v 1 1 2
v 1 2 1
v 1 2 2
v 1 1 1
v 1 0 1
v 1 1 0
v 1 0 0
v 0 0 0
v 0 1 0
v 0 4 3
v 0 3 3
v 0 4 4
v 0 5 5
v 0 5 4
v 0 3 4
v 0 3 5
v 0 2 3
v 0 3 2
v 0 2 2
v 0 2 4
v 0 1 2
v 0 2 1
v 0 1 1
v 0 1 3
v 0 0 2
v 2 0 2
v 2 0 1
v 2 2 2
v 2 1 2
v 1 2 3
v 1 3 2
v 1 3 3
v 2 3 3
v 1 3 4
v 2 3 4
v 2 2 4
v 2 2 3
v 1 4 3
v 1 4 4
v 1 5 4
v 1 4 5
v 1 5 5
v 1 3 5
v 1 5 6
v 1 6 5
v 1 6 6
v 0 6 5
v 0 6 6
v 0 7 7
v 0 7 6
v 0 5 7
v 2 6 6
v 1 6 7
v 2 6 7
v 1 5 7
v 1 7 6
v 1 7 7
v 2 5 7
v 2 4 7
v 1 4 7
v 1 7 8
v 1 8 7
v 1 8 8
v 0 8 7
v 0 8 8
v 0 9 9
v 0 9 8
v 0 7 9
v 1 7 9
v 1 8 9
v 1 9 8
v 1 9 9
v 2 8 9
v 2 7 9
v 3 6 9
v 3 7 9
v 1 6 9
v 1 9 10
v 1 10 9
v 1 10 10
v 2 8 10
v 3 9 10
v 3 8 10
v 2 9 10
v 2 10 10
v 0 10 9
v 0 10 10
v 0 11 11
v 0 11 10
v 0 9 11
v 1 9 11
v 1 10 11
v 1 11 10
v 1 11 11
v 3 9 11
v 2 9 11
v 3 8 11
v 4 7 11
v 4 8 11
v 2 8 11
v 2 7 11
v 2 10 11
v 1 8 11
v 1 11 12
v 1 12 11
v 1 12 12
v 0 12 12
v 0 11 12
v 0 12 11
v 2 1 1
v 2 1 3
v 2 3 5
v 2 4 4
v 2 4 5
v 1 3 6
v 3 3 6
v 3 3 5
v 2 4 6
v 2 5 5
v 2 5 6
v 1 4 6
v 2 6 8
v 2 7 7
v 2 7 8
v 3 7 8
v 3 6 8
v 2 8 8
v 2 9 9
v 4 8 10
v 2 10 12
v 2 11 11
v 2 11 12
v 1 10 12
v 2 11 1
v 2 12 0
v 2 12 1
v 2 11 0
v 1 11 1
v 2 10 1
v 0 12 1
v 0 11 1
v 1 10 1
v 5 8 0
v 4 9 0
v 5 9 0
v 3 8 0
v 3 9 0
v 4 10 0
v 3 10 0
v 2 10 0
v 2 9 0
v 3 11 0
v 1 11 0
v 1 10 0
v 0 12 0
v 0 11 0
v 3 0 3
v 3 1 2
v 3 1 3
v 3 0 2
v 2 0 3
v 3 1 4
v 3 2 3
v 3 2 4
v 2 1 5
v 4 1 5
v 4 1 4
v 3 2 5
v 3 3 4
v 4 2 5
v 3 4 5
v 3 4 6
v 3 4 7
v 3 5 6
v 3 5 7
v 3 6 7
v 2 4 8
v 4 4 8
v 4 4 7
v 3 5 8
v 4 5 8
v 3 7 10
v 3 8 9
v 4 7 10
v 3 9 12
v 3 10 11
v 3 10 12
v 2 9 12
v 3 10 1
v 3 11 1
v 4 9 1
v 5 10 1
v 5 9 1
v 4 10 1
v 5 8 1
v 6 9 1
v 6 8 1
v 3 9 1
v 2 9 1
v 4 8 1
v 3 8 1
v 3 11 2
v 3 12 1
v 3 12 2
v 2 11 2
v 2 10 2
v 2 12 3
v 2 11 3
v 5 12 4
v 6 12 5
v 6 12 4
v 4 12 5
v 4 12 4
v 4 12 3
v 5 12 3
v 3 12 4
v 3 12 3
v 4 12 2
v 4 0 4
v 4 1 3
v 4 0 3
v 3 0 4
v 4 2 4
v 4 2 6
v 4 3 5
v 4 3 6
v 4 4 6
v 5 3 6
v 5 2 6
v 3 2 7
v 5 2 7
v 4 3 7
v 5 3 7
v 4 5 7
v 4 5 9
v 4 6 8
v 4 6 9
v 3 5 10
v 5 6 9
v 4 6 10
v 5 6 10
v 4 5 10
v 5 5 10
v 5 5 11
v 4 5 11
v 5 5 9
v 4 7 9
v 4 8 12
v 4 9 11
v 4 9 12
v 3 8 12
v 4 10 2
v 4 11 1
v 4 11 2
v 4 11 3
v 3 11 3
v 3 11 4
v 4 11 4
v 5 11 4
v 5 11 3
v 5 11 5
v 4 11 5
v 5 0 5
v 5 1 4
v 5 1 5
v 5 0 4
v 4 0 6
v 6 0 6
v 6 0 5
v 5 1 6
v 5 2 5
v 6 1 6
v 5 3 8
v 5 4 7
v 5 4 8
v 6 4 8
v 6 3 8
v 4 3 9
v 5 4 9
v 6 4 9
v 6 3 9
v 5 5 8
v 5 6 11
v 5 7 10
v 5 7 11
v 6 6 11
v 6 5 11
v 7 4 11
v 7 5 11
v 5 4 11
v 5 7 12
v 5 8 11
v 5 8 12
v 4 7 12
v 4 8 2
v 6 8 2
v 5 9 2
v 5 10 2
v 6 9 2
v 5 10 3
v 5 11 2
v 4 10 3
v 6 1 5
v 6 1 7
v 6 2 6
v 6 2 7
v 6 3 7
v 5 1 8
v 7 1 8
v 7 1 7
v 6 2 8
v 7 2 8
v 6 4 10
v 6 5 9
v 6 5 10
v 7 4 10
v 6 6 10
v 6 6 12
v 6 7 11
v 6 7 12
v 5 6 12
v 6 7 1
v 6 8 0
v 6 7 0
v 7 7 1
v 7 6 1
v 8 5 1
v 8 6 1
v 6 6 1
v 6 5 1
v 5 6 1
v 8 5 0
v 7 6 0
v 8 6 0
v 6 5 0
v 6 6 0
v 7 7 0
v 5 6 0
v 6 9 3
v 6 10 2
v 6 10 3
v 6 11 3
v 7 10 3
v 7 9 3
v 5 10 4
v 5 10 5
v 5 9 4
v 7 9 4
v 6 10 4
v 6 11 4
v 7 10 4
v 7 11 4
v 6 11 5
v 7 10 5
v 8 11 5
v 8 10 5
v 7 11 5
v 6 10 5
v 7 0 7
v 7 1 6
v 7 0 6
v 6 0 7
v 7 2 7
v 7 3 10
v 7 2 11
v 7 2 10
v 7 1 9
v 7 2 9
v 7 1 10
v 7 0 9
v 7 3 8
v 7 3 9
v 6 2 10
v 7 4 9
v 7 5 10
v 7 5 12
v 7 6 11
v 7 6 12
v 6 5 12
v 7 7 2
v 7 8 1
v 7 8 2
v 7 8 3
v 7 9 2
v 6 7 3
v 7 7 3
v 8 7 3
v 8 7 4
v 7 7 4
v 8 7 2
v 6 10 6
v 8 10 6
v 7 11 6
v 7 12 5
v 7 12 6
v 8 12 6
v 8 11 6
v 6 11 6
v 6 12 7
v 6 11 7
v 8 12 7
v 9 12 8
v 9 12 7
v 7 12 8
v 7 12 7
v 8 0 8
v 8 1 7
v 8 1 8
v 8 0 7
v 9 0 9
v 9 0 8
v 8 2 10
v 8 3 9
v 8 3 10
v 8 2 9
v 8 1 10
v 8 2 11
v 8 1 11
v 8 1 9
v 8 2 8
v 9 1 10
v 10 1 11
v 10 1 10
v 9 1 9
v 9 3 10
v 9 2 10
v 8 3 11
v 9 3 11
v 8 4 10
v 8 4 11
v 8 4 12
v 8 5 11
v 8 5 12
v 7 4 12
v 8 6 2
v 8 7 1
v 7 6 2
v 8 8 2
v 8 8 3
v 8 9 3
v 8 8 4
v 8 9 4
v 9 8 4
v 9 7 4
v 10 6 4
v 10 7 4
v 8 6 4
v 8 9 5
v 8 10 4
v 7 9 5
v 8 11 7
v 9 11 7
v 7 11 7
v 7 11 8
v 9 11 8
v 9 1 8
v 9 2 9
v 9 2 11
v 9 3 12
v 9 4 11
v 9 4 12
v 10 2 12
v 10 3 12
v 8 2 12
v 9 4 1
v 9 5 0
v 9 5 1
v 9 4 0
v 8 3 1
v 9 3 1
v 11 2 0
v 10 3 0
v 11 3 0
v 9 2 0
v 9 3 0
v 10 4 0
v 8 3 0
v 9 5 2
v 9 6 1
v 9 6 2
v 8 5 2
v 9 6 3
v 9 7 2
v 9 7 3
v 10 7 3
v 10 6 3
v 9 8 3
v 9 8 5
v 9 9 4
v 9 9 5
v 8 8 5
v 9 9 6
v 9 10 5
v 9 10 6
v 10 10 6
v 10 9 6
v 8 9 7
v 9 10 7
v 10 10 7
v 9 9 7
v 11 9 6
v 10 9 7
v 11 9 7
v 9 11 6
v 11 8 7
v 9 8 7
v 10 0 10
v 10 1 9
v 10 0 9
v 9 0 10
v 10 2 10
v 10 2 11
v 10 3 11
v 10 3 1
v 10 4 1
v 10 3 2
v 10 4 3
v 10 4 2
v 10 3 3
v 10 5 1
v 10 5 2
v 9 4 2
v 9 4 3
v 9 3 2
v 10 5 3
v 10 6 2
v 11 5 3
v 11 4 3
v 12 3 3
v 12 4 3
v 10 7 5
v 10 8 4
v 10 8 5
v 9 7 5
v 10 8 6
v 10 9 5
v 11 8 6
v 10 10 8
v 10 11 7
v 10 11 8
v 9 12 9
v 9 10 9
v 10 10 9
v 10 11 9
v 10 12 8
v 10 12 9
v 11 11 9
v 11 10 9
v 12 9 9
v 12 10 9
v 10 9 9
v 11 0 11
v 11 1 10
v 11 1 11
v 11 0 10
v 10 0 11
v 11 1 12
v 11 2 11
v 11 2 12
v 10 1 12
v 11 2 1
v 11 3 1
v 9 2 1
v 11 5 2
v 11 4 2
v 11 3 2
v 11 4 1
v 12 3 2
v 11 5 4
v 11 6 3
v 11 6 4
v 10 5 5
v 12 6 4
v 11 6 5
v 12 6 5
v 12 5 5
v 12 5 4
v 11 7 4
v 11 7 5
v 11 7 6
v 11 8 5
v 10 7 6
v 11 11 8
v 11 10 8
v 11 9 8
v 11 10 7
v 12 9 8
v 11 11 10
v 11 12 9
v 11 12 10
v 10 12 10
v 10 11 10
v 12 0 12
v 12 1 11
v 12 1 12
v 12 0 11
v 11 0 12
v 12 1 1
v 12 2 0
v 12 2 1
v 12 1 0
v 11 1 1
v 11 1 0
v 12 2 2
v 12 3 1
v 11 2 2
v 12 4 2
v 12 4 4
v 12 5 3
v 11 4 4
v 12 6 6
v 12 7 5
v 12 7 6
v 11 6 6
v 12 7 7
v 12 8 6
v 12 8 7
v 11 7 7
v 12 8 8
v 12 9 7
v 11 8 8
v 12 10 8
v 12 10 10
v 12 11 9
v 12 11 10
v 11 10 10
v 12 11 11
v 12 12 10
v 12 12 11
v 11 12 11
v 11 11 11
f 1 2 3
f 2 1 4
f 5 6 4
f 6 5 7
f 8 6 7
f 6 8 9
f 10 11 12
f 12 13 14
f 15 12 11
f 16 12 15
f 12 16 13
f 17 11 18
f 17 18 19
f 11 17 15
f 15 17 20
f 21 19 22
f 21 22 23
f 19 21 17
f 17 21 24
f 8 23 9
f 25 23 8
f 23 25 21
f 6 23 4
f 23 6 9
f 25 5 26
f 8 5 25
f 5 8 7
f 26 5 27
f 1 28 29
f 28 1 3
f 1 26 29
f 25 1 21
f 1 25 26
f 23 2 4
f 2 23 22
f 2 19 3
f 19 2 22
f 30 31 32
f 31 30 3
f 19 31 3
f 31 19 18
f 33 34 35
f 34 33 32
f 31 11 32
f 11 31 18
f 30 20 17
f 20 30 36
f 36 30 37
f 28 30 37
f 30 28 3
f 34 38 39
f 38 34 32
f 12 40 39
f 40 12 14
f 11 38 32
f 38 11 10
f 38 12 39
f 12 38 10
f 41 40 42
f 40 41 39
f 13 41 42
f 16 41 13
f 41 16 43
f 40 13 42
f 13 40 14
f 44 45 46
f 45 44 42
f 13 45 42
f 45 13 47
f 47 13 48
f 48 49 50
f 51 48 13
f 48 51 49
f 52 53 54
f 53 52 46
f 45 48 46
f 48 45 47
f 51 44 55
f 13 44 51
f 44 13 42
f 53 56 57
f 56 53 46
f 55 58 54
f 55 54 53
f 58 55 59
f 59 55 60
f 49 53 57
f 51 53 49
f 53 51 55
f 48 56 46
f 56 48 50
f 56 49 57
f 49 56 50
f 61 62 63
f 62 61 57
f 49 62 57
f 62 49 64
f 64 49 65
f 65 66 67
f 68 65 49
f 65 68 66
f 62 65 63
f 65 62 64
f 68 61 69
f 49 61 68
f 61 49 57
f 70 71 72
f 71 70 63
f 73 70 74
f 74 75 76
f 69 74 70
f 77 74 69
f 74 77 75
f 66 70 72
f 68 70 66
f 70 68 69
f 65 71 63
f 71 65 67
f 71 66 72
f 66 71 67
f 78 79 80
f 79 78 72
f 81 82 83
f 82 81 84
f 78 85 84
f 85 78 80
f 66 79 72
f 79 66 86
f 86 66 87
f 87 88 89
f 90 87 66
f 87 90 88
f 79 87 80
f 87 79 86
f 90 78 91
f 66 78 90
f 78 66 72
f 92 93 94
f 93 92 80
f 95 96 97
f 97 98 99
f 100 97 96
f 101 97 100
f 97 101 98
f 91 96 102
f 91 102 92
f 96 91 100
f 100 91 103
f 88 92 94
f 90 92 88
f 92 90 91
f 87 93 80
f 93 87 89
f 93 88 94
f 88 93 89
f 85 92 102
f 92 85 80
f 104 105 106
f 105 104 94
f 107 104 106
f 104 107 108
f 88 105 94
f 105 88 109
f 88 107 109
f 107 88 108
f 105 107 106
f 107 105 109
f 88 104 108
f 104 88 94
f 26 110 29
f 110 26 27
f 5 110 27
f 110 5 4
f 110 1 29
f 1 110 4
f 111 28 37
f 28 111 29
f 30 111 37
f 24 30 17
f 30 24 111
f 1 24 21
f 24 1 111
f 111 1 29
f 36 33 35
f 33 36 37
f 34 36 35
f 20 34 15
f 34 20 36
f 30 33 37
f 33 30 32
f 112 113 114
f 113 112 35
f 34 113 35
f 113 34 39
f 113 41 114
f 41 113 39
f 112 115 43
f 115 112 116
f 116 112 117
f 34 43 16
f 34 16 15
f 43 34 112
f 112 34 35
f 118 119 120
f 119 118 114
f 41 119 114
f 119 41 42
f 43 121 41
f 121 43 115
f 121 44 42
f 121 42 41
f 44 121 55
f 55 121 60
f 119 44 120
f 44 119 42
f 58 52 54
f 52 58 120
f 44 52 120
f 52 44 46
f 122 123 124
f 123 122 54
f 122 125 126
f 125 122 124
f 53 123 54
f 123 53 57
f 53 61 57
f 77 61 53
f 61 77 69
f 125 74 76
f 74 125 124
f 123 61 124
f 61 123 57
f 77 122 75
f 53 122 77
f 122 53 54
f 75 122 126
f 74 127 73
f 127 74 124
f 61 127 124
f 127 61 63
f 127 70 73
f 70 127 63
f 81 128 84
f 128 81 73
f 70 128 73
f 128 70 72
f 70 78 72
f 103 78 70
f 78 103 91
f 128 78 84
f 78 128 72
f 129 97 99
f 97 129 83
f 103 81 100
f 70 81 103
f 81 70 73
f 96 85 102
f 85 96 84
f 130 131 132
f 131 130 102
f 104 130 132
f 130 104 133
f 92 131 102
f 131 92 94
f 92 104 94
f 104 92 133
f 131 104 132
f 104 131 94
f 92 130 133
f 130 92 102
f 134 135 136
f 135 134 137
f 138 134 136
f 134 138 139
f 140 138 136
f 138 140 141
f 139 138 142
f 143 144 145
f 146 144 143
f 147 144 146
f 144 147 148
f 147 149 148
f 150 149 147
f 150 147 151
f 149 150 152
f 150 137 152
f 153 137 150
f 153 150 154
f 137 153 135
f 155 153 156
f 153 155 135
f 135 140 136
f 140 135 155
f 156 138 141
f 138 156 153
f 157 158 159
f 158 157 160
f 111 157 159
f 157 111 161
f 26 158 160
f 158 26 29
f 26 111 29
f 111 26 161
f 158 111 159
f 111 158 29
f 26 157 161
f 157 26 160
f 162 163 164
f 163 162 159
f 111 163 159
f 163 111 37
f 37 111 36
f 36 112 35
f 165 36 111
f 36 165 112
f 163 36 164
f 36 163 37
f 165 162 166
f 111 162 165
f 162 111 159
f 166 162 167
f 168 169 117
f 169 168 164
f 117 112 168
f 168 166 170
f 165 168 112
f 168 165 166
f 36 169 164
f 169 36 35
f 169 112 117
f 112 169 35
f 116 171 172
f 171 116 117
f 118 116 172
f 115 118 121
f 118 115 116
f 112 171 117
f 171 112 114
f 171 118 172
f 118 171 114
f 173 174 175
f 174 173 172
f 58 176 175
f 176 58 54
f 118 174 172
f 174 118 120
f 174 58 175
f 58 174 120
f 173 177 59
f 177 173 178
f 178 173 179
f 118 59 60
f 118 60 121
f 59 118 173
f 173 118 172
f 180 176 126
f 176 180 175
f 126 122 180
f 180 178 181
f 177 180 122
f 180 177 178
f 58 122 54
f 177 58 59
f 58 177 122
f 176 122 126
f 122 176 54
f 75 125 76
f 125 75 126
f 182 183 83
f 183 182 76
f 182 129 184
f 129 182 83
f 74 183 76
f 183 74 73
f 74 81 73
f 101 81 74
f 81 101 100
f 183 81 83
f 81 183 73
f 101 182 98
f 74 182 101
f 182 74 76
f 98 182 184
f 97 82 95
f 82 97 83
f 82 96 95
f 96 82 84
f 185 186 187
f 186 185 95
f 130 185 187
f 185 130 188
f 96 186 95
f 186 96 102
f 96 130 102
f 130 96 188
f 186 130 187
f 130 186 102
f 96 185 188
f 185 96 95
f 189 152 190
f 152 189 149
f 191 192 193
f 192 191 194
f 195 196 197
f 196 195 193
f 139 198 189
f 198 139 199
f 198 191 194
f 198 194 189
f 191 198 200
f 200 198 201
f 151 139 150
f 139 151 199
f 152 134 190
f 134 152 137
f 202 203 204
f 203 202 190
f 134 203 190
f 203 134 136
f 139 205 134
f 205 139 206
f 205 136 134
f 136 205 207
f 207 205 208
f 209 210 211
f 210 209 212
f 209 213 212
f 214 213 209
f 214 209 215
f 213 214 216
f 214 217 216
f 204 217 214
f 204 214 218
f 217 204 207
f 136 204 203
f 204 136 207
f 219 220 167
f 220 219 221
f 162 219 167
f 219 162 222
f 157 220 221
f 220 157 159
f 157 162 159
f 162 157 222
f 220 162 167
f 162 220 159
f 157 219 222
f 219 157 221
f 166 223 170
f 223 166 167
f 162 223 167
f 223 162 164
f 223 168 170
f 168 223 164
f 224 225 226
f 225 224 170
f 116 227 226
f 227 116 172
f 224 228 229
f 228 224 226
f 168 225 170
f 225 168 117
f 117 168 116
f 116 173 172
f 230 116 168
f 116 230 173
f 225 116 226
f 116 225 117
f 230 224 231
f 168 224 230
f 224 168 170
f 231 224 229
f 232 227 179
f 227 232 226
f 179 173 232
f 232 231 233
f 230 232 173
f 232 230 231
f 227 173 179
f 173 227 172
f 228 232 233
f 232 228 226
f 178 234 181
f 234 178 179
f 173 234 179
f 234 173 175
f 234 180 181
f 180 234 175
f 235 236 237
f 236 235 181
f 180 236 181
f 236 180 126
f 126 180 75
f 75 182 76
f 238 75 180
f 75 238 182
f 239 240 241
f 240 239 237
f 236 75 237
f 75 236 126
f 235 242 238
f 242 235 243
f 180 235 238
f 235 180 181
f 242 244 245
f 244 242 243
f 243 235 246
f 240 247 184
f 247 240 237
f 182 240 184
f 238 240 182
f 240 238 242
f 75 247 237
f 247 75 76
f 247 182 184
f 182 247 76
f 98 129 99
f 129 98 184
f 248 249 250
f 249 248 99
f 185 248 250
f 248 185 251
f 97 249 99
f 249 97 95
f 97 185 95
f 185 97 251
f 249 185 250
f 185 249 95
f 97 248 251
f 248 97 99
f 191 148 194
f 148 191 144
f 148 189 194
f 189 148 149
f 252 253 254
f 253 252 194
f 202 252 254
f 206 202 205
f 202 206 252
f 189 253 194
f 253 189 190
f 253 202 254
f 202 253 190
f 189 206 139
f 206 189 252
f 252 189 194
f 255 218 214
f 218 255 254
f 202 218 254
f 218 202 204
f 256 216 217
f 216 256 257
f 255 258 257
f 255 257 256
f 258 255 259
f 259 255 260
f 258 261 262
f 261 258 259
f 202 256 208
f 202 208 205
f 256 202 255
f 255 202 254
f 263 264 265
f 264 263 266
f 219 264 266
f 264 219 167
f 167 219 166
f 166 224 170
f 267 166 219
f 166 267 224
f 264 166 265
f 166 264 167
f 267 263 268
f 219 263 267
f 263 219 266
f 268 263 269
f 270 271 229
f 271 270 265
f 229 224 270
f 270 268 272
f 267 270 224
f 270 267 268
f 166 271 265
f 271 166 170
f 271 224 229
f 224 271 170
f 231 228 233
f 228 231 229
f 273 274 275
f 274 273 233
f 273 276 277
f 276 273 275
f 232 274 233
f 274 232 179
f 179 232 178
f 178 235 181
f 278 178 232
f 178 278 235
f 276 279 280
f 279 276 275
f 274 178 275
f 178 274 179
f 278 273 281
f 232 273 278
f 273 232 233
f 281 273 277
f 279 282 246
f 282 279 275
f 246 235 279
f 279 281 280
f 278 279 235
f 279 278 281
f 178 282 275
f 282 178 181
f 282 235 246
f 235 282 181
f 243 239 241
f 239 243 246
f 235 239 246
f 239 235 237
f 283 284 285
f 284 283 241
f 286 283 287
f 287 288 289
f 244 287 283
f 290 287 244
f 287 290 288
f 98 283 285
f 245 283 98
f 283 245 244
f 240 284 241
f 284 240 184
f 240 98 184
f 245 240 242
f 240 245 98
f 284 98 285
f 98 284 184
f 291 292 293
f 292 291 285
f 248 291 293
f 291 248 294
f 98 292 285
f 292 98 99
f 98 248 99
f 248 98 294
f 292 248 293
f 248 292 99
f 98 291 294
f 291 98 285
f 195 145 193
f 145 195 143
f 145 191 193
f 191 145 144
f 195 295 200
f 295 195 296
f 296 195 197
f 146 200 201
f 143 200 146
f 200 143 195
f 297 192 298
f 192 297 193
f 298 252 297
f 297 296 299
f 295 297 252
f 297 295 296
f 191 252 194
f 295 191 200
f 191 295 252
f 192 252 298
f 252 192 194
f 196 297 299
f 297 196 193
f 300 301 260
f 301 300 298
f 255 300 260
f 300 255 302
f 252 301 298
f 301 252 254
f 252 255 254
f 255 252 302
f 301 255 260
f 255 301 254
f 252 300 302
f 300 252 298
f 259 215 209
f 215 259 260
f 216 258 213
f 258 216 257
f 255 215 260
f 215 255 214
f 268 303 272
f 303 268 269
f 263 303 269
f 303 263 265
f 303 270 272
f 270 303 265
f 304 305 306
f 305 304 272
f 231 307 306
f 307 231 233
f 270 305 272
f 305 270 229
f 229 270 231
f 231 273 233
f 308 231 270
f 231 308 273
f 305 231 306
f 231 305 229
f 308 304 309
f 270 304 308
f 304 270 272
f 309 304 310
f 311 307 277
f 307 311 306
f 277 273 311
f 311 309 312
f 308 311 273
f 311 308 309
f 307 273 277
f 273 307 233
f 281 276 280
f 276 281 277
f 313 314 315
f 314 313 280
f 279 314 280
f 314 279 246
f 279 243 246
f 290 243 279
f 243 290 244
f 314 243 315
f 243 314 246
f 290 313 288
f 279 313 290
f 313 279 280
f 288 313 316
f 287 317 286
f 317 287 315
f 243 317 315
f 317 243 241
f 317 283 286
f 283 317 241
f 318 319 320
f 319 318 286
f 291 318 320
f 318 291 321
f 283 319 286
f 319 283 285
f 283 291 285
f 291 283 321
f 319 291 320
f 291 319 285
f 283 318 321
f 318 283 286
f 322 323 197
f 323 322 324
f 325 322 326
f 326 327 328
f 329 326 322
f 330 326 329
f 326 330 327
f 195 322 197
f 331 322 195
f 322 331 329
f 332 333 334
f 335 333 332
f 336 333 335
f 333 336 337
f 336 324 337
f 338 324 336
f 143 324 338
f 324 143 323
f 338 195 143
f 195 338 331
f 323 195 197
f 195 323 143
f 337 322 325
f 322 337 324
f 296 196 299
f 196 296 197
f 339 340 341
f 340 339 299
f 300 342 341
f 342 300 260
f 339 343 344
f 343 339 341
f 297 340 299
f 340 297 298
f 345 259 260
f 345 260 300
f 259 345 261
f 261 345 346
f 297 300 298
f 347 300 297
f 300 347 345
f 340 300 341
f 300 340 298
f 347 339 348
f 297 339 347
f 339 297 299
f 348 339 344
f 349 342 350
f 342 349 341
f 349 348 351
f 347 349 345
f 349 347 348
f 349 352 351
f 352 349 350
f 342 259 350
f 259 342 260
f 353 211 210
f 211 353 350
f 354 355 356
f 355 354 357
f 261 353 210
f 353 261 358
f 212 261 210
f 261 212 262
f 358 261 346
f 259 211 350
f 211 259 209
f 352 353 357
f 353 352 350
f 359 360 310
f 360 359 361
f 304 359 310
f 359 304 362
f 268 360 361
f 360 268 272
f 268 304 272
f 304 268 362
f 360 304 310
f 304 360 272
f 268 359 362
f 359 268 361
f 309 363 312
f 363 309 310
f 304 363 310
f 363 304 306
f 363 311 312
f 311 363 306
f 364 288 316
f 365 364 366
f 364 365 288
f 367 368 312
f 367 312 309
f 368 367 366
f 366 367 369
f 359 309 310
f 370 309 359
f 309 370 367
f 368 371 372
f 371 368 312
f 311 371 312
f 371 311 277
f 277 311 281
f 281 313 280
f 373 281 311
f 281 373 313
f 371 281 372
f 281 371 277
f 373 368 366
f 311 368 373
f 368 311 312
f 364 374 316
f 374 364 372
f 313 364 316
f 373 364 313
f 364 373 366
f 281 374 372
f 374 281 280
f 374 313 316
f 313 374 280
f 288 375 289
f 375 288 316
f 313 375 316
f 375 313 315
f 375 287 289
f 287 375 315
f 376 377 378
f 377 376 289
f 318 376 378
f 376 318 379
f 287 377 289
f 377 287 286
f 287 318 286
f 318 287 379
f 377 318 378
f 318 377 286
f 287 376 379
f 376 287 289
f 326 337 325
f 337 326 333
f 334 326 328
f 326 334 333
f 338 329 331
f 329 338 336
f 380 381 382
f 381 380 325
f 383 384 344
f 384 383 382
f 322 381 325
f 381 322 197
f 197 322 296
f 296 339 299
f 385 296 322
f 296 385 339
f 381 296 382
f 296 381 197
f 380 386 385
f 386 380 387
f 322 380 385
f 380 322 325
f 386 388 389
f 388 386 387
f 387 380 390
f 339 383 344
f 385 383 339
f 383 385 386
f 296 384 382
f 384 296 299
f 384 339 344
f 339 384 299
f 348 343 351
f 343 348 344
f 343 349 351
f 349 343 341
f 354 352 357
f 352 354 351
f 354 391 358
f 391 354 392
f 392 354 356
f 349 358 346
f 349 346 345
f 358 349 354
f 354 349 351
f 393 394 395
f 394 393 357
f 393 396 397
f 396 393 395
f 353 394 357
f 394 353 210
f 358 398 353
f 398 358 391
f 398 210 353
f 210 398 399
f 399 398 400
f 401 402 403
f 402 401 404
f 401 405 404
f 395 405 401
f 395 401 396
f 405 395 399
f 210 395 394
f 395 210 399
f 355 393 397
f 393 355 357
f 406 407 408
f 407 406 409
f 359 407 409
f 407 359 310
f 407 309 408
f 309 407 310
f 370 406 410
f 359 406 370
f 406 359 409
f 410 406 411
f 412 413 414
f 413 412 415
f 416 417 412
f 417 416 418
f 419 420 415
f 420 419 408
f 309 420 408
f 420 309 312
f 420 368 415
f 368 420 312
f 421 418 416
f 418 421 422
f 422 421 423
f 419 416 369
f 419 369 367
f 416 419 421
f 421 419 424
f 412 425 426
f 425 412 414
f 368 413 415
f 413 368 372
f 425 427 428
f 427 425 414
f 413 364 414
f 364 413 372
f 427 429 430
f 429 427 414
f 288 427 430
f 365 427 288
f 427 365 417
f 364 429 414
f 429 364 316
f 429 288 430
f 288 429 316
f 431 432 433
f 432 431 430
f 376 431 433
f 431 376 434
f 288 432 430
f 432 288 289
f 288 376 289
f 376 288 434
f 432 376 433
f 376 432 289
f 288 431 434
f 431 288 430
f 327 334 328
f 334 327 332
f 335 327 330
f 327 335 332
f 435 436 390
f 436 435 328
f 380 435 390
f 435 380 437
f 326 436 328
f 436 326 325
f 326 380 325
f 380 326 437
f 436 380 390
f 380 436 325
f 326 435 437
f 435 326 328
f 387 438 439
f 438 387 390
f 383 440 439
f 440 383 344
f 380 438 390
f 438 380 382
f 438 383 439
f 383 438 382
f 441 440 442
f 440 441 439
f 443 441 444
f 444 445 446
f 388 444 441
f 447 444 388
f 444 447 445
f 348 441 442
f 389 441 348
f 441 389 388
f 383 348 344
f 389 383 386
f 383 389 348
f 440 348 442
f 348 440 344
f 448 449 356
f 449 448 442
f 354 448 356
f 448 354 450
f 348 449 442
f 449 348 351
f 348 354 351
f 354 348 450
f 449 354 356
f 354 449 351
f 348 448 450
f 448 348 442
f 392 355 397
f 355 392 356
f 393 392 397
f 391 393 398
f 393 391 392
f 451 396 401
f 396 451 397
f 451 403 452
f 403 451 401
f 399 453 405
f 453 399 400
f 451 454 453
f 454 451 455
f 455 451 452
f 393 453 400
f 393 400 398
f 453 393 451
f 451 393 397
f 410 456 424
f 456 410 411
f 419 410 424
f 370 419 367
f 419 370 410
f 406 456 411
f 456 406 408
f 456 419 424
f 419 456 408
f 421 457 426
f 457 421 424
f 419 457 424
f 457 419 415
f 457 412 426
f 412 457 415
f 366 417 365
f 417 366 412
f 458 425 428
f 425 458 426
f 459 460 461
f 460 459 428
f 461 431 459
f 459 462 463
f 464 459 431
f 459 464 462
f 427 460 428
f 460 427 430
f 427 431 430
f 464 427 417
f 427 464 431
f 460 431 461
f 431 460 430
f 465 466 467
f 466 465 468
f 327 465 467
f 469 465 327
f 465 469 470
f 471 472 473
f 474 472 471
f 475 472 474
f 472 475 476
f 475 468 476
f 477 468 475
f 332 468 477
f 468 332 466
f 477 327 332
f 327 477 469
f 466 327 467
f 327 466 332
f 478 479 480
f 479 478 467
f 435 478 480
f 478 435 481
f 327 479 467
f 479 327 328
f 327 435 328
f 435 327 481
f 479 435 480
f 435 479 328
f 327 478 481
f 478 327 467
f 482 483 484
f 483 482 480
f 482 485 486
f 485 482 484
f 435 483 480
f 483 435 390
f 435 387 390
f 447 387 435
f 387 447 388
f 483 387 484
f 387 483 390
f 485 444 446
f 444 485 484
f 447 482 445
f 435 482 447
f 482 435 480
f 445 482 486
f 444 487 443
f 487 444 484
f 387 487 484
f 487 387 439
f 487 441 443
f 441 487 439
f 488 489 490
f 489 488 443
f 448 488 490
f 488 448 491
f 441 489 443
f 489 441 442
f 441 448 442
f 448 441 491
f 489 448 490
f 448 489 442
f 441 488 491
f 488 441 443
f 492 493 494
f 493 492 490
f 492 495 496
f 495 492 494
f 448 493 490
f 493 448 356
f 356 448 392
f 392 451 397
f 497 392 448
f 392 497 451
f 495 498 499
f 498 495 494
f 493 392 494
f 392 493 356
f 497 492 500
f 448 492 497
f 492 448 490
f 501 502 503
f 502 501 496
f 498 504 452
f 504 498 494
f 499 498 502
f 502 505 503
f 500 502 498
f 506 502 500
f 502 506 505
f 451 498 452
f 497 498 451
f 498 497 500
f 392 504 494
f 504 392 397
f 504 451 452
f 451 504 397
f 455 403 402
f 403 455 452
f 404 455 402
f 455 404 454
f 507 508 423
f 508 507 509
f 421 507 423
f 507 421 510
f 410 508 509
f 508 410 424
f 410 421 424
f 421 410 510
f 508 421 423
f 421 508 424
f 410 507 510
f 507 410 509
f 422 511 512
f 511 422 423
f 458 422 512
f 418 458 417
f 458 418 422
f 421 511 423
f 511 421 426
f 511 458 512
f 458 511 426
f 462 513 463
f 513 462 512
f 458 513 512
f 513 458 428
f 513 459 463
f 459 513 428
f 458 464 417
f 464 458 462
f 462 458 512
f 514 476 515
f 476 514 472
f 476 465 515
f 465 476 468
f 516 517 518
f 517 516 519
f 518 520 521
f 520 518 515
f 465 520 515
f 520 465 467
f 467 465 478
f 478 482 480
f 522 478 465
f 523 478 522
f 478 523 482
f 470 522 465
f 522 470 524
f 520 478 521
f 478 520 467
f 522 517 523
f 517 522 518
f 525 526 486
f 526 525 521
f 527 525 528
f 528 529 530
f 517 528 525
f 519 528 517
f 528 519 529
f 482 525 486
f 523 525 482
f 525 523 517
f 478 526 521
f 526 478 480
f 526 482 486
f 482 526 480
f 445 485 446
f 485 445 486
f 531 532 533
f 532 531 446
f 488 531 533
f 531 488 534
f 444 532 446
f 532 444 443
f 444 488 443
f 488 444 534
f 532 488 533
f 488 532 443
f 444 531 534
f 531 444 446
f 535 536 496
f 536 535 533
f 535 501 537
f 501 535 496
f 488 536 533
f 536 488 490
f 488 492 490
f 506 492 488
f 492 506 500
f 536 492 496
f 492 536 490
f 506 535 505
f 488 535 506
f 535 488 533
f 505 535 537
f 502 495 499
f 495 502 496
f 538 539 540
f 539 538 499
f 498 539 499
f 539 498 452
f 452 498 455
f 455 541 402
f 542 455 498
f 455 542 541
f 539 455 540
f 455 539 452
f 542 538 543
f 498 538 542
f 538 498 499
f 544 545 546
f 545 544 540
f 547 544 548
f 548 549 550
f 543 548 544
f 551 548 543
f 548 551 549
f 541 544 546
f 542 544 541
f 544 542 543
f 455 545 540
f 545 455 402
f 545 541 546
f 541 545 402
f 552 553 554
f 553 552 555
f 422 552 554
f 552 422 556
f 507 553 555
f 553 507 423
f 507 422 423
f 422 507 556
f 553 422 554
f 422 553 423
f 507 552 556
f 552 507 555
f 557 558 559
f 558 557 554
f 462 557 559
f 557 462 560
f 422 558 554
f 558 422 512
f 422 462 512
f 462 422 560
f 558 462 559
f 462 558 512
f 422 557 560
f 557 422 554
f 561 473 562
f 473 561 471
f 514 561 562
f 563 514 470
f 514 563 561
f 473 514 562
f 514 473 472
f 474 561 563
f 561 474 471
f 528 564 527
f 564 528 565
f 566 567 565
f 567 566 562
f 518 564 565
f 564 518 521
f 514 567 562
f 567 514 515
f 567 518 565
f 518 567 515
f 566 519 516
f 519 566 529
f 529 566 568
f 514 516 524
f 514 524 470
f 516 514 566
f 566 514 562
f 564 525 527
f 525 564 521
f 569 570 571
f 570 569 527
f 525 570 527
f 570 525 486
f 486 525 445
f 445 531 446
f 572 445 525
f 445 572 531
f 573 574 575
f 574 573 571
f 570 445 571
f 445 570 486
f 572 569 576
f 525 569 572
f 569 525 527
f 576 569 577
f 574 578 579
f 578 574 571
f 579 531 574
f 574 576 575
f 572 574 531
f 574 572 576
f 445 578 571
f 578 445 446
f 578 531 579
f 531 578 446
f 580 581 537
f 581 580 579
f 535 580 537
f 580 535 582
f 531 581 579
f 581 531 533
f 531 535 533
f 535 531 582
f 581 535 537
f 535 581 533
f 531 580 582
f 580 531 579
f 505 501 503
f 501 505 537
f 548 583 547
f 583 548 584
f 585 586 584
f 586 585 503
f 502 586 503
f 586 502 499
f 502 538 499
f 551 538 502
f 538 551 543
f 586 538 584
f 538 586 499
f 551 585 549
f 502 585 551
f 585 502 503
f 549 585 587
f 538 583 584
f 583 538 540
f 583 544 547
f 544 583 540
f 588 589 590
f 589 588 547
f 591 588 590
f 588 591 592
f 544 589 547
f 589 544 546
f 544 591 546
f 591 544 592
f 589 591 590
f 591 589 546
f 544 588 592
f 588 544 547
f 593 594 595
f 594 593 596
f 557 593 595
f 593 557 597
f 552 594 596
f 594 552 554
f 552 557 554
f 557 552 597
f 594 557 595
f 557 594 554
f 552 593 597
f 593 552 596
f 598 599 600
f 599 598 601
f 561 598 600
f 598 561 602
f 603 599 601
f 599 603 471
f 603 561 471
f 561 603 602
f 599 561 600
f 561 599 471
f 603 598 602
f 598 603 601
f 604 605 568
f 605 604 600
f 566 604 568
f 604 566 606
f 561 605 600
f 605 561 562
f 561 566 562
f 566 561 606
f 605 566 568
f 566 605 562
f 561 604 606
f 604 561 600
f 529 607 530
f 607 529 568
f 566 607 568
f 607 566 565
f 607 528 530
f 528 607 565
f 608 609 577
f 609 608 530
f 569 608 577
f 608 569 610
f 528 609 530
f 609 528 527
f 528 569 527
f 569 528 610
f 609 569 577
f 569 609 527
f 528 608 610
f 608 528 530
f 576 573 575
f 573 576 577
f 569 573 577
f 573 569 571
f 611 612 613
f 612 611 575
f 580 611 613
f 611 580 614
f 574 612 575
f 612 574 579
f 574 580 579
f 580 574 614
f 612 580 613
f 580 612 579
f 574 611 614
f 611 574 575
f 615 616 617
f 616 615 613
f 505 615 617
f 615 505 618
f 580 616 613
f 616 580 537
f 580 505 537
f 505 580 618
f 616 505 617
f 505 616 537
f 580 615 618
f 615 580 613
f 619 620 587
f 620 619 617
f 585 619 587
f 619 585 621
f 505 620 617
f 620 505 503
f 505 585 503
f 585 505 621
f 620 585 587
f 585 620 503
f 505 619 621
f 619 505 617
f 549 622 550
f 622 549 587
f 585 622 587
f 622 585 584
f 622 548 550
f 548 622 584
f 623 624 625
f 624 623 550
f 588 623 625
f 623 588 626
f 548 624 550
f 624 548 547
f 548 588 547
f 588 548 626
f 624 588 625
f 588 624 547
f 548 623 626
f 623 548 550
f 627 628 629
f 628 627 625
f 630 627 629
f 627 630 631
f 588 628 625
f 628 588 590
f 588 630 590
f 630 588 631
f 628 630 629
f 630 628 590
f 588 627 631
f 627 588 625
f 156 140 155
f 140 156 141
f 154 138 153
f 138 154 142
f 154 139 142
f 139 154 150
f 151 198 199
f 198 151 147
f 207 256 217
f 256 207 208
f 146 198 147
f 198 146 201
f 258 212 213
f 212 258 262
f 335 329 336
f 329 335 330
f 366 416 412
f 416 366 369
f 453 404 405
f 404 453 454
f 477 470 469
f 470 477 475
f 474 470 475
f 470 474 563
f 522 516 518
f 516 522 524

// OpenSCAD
union() {
    translate([0, 0, 0]) cube([1, 1, 1]);
    translate([0, 1, 1]) cube([1, 1, 1]);
    translate([0, 2, 2]) cube([1, 1, 1]);
    translate([0, 3, 3]) cube([1, 1, 1]);
    translate([0, 4, 4]) cube([1, 1, 1]);
    translate([0, 5, 5]) cube([1, 1, 1]);
    translate([0, 6, 6]) cube([1, 1, 1]);
    translate([0, 7, 7]) cube([1, 1, 1]);
    translate([0, 8, 8]) cube([1, 1, 1]);
    translate([0, 9, 9]) cube([1, 1, 1]);
    translate([0, 10, 10]) cube([1, 1, 1]);
    translate([0, 11, 11]) cube([1, 1, 1]);
    translate([1, 0, 1]) cube([1, 1, 1]);
    translate([1, 1, 2]) cube([1, 1, 1]);
    translate([1, 2, 3]) cube([1, 1, 1]);
    translate([1, 3, 4]) cube([1, 1, 1]);
    translate([1, 4, 5]) cube([1, 1, 1]);
    translate([1, 5, 6]) cube([1, 1, 1]);
    translate([1, 6, 7]) cube([1, 1, 1]);
    translate([1, 7, 8]) cube([1, 1, 1]);
    translate([1, 8, 9]) cube([1, 1, 1]);
    translate([1, 9, 10]) cube([1, 1, 1]);
    translate([1, 10, 11]) cube([1, 1, 1]);
    translate([1, 11, 0]) cube([1, 1, 1]);
    translate([2, 0, 2]) cube([1, 1, 1]);
    translate([2, 1, 3]) cube([1, 1, 1]);
    translate([2, 2, 4]) cube([1, 1, 1]);
    translate([2, 3, 5]) cube([1, 1, 1]);
    translate([2, 4, 6]) cube([1, 1, 1]);
    translate([2, 5, 7]) cube([1, 1, 1]);
    translate([2, 6, 8]) cube([1, 1, 1]);
    translate([2, 7, 9]) cube([1, 1, 1]);
    translate([2, 8, 10]) cube([1, 1, 1]);
    translate([2, 9, 11]) cube([1, 1, 1]);
    translate([2, 10, 0]) cube([1, 1, 1]);
    translate([2, 11, 1]) cube([1, 1, 1]);
    translate([3, 0, 3]) cube([1, 1, 1]);
    translate([3, 1, 4]) cube([1, 1, 1]);
    translate([3, 2, 5]) cube([1, 1, 1]);
    translate([3, 3, 6]) cube([1, 1, 1]);
    translate([3, 4, 7]) cube([1, 1, 1]);
    translate([3, 5, 8]) cube([1, 1, 1]);
    translate([3, 6, 9]) cube([1, 1, 1]);
    translate([3, 7, 10]) cube([1, 1, 1]);
    translate([3, 8, 11]) cube([1, 1, 1]);
    translate([3, 9, 0]) cube([1, 1, 1]);
    translate([3, 10, 1]) cube([1, 1, 1]);
    translate([3, 11, 2]) cube([1, 1, 1]);
    translate([4, 0, 4]) cube([1, 1, 1]);
    translate([4, 1, 5]) cube([1, 1, 1]);
    translate([4, 2, 6]) cube([1, 1, 1]);
    translate([4, 3, 7]) cube([1, 1, 1]);
    translate([4, 4, 8]) cube([1, 1, 1]);
    translate([4, 5, 9]) cube([1, 1, 1]);
    translate([4, 6, 10]) cube([1, 1, 1]);
    translate([4, 7, 11]) cube([1, 1, 1]);
    translate([4, 8, 0]) cube([1, 1, 1]);
    translate([4, 9, 1]) cube([1, 1, 1]);
    translate([4, 10, 2]) cube([1, 1, 1]);
    translate([4, 11, 3]) cube([1, 1, 1]);
    translate([5, 0, 5]) cube([1, 1, 1]);
    translate([5, 1, 6]) cube([1, 1, 1]);
    translate([5, 2, 7]) cube([1, 1, 1]);
    translate([5, 3, 8]) cube([1, 1, 1]);
    translate([5, 4, 9]) cube([1, 1, 1]);
    translate([5, 5, 10]) cube([1, 1, 1]);
    translate([5, 6, 11]) cube([1, 1, 1]);
    translate([5, 7, 0]) cube([1, 1, 1]);
    translate([5, 8, 1]) cube([1, 1, 1]);
    translate([5, 9, 2]) cube([1, 1, 1]);
    translate([5, 10, 3]) cube([1, 1, 1]);
    translate([5, 11, 4]) cube([1, 1, 1]);
    translate([6, 0, 6]) cube([1, 1, 1]);
    translate([6, 1, 7]) cube([1, 1, 1]);
    translate([6, 2, 8]) cube([1, 1, 1]);
    translate([6, 3, 9]) cube([1, 1, 1]);
    translate([6, 4, 10]) cube([1, 1, 1]);
    translate([6, 5, 11]) cube([1, 1, 1]);
    translate([6, 6, 0]) cube([1, 1, 1]);
    translate([6, 7, 1]) cube([1, 1, 1]);
    translate([6, 8, 2]) cube([1, 1, 1]);
    translate([6, 9, 3]) cube([1, 1, 1]);
    translate([6, 10, 4]) cube([1, 1, 1]);
    translate([6, 11, 5]) cube([1, 1, 1]);
    translate([7, 0, 7]) cube([1, 1, 1]);
    translate([7, 1, 8]) cube([1, 1, 1]);
    translate([7, 2, 9]) cube([1, 1, 1]);
    translate([7, 3, 10]) cube([1, 1, 1]);
    translate([7, 4, 11]) cube([1, 1, 1]);
    translate([7, 5, 0]) cube([1, 1, 1]);
    translate([7, 6, 1]) cube([1, 1, 1]);
    translate([7, 7, 2]) cube([1, 1, 1]);
    translate([7, 8, 3]) cube([1, 1, 1]);
    translate([7, 9, 4]) cube([1, 1, 1]);
    translate([7, 10, 5]) cube([1, 1, 1]);
    translate([7, 11, 6]) cube([1, 1, 1]);
    translate([8, 0, 8]) cube([1, 1, 1]);
    translate([8, 1, 9]) cube([1, 1, 1]);
    translate([8, 2, 10]) cube([1, 1, 1]);
    translate([8, 3, 11]) cube([1, 1, 1]);
    translate([8, 4, 0]) cube([1, 1, 1]);
    translate([8, 5, 1]) cube([1, 1, 1]);
    translate([8, 6, 2]) cube([1, 1, 1]);
    translate([8, 7, 3]) cube([1, 1, 1]);
    translate([8, 8, 4]) cube([1, 1, 1]);
    translate([8, 9, 5]) cube([1, 1, 1]);
    translate([8, 10, 6]) cube([1, 1, 1]);
    translate([8, 11, 7]) cube([1, 1, 1]);
    translate([9, 0, 9]) cube([1, 1, 1]);
    translate([9, 1, 10]) cube([1, 1, 1]);
    translate([9, 2, 11]) cube([1, 1, 1]);
    translate([9, 3, 0]) cube([1, 1, 1]);
    translate([9, 4, 1]) cube([1, 1, 1]);
    translate([9, 5, 2]) cube([1, 1, 1]);
    translate([9, 6, 3]) cube([1, 1, 1]);
    translate([9, 7, 4]) cube([1, 1, 1]);
    translate([9, 8, 5]) cube([1, 1, 1]);
    translate([9, 9, 6]) cube([1, 1, 1]);
    translate([9, 10, 7]) cube([1, 1, 1]);
    translate([9, 11, 8]) cube([1, 1, 1]);
    translate([10, 0, 10]) cube([1, 1, 1]);
    translate([10, 1, 11]) cube([1, 1, 1]);
    translate([10, 2, 0]) cube([1, 1, 1]);
    translate([10, 3, 1]) cube([1, 1, 1]);
    translate([10, 4, 2]) cube([1, 1, 1]);
    translate([10, 5, 3]) cube([1, 1, 1]);
    translate([10, 6, 4]) cube([1, 1, 1]);
    translate([10, 7, 5]) cube([1, 1, 1]);
    translate([10, 8, 6]) cube([1, 1, 1]);
    translate([10, 9, 7]) cube([1, 1, 1]);
    translate([10, 10, 8]) cube([1, 1, 1]);
    translate([10, 11, 9]) cube([1, 1, 1]);
    translate([11, 0, 11]) cube([1, 1, 1]);
    translate([11, 1, 0]) cube([1, 1, 1]);
    translate([11, 2, 1]) cube([1, 1, 1]);
    translate([11, 3, 2]) cube([1, 1, 1]);
    translate([11, 4, 3]) cube([1, 1, 1]);
    translate([11, 5, 4]) cube([1, 1, 1]);
    translate([11, 6, 5]) cube([1, 1, 1]);
    translate([11, 7, 6]) cube([1, 1, 1]);
    translate([11, 8, 7]) cube([1, 1, 1]);
    translate([11, 9, 8]) cube([1, 1, 1]);
    translate([11, 10, 9]) cube([1, 1, 1]);
    translate([11, 11, 10]) cube([1, 1, 1]);
    translate([0, 0, 1]) cube([1, 1, 1]);
    translate([0, 1, 2]) cube([1, 1, 1]);
    translate([0, 2, 3]) cube([1, 1, 1]);
    translate([0, 3, 4]) cube([1, 1, 1]);
    translate([0, 5, 6]) cube([1, 1, 1]);
    translate([0, 7, 8]) cube([1, 1, 1]);
    translate([0, 9, 10]) cube([1, 1, 1]);
    translate([0, 11, 0]) cube([1, 1, 1]);
    translate([1, 3, 5]) cube([1, 1, 1]);
    translate([1, 4, 6]) cube([1, 1, 1]);
    translate([1, 6, 8]) cube([1, 1, 1]);
    translate([1, 8, 10]) cube([1, 1, 1]);
    translate([1, 10, 0]) cube([1, 1, 1]);
    translate([2, 1, 4]) cube([1, 1, 1]);
    translate([2, 4, 7]) cube([1, 1, 1]);
    translate([2, 7, 10]) cube([1, 1, 1]);
    translate([2, 9, 0]) cube([1, 1, 1]);
    translate([2, 10, 1]) cube([1, 1, 1]);
    translate([2, 11, 2]) cube([1, 1, 1]);
    translate([3, 2, 6]) cube([1, 1, 1]);
    translate([3, 5, 9]) cube([1, 1, 1]);
    translate([3, 8, 0]) cube([1, 1, 1]);
    translate([3, 11, 3]) cube([1, 1, 1]);
    translate([4, 0, 5]) cube([1, 1, 1]);
    translate([4, 3, 8]) cube([1, 1, 1]);
    translate([4, 5, 10]) cube([1, 1, 1]);
    translate([4, 8, 1]) cube([1, 1, 1]);
    translate([4, 11, 4]) cube([1, 1, 1]);
    translate([5, 1, 7]) cube([1, 1, 1]);
    translate([5, 4, 10]) cube([1, 1, 1]);
    translate([5, 6, 0]) cube([1, 1, 1]);
    translate([5, 9, 3]) cube([1, 1, 1]);
    translate([5, 10, 4]) cube([1, 1, 1]);
    translate([6, 2, 9]) cube([1, 1, 1]);
    translate([6, 5, 0]) cube([1, 1, 1]);
    translate([6, 7, 2]) cube([1, 1, 1]);
    translate([6, 10, 5]) cube([1, 1, 1]);
    translate([6, 11, 6]) cube([1, 1, 1]);
    translate([7, 0, 8]) cube([1, 1, 1]);
    translate([7, 1, 9]) cube([1, 1, 1]);
    translate([7, 2, 10]) cube([1, 1, 1]);
    translate([7, 7, 3]) cube([1, 1, 1]);
    translate([7, 11, 7]) cube([1, 1, 1]);
    translate([8, 1, 10]) cube([1, 1, 1]);
    translate([8, 2, 11]) cube([1, 1, 1]);
    translate([8, 3, 0]) cube([1, 1, 1]);
    translate([8, 6, 3]) cube([1, 1, 1]);
    translate([8, 9, 6]) cube([1, 1, 1]);
    translate([9, 2, 0]) cube([1, 1, 1]);
    translate([9, 3, 1]) cube([1, 1, 1]);
    translate([9, 4, 2]) cube([1, 1, 1]);
    translate([9, 8, 6]) cube([1, 1, 1]);
    translate([9, 10, 8]) cube([1, 1, 1]);
    translate([10, 3, 2]) cube([1, 1, 1]);
    translate([10, 5, 4]) cube([1, 1, 1]);
    translate([10, 9, 8]) cube([1, 1, 1]);
}
